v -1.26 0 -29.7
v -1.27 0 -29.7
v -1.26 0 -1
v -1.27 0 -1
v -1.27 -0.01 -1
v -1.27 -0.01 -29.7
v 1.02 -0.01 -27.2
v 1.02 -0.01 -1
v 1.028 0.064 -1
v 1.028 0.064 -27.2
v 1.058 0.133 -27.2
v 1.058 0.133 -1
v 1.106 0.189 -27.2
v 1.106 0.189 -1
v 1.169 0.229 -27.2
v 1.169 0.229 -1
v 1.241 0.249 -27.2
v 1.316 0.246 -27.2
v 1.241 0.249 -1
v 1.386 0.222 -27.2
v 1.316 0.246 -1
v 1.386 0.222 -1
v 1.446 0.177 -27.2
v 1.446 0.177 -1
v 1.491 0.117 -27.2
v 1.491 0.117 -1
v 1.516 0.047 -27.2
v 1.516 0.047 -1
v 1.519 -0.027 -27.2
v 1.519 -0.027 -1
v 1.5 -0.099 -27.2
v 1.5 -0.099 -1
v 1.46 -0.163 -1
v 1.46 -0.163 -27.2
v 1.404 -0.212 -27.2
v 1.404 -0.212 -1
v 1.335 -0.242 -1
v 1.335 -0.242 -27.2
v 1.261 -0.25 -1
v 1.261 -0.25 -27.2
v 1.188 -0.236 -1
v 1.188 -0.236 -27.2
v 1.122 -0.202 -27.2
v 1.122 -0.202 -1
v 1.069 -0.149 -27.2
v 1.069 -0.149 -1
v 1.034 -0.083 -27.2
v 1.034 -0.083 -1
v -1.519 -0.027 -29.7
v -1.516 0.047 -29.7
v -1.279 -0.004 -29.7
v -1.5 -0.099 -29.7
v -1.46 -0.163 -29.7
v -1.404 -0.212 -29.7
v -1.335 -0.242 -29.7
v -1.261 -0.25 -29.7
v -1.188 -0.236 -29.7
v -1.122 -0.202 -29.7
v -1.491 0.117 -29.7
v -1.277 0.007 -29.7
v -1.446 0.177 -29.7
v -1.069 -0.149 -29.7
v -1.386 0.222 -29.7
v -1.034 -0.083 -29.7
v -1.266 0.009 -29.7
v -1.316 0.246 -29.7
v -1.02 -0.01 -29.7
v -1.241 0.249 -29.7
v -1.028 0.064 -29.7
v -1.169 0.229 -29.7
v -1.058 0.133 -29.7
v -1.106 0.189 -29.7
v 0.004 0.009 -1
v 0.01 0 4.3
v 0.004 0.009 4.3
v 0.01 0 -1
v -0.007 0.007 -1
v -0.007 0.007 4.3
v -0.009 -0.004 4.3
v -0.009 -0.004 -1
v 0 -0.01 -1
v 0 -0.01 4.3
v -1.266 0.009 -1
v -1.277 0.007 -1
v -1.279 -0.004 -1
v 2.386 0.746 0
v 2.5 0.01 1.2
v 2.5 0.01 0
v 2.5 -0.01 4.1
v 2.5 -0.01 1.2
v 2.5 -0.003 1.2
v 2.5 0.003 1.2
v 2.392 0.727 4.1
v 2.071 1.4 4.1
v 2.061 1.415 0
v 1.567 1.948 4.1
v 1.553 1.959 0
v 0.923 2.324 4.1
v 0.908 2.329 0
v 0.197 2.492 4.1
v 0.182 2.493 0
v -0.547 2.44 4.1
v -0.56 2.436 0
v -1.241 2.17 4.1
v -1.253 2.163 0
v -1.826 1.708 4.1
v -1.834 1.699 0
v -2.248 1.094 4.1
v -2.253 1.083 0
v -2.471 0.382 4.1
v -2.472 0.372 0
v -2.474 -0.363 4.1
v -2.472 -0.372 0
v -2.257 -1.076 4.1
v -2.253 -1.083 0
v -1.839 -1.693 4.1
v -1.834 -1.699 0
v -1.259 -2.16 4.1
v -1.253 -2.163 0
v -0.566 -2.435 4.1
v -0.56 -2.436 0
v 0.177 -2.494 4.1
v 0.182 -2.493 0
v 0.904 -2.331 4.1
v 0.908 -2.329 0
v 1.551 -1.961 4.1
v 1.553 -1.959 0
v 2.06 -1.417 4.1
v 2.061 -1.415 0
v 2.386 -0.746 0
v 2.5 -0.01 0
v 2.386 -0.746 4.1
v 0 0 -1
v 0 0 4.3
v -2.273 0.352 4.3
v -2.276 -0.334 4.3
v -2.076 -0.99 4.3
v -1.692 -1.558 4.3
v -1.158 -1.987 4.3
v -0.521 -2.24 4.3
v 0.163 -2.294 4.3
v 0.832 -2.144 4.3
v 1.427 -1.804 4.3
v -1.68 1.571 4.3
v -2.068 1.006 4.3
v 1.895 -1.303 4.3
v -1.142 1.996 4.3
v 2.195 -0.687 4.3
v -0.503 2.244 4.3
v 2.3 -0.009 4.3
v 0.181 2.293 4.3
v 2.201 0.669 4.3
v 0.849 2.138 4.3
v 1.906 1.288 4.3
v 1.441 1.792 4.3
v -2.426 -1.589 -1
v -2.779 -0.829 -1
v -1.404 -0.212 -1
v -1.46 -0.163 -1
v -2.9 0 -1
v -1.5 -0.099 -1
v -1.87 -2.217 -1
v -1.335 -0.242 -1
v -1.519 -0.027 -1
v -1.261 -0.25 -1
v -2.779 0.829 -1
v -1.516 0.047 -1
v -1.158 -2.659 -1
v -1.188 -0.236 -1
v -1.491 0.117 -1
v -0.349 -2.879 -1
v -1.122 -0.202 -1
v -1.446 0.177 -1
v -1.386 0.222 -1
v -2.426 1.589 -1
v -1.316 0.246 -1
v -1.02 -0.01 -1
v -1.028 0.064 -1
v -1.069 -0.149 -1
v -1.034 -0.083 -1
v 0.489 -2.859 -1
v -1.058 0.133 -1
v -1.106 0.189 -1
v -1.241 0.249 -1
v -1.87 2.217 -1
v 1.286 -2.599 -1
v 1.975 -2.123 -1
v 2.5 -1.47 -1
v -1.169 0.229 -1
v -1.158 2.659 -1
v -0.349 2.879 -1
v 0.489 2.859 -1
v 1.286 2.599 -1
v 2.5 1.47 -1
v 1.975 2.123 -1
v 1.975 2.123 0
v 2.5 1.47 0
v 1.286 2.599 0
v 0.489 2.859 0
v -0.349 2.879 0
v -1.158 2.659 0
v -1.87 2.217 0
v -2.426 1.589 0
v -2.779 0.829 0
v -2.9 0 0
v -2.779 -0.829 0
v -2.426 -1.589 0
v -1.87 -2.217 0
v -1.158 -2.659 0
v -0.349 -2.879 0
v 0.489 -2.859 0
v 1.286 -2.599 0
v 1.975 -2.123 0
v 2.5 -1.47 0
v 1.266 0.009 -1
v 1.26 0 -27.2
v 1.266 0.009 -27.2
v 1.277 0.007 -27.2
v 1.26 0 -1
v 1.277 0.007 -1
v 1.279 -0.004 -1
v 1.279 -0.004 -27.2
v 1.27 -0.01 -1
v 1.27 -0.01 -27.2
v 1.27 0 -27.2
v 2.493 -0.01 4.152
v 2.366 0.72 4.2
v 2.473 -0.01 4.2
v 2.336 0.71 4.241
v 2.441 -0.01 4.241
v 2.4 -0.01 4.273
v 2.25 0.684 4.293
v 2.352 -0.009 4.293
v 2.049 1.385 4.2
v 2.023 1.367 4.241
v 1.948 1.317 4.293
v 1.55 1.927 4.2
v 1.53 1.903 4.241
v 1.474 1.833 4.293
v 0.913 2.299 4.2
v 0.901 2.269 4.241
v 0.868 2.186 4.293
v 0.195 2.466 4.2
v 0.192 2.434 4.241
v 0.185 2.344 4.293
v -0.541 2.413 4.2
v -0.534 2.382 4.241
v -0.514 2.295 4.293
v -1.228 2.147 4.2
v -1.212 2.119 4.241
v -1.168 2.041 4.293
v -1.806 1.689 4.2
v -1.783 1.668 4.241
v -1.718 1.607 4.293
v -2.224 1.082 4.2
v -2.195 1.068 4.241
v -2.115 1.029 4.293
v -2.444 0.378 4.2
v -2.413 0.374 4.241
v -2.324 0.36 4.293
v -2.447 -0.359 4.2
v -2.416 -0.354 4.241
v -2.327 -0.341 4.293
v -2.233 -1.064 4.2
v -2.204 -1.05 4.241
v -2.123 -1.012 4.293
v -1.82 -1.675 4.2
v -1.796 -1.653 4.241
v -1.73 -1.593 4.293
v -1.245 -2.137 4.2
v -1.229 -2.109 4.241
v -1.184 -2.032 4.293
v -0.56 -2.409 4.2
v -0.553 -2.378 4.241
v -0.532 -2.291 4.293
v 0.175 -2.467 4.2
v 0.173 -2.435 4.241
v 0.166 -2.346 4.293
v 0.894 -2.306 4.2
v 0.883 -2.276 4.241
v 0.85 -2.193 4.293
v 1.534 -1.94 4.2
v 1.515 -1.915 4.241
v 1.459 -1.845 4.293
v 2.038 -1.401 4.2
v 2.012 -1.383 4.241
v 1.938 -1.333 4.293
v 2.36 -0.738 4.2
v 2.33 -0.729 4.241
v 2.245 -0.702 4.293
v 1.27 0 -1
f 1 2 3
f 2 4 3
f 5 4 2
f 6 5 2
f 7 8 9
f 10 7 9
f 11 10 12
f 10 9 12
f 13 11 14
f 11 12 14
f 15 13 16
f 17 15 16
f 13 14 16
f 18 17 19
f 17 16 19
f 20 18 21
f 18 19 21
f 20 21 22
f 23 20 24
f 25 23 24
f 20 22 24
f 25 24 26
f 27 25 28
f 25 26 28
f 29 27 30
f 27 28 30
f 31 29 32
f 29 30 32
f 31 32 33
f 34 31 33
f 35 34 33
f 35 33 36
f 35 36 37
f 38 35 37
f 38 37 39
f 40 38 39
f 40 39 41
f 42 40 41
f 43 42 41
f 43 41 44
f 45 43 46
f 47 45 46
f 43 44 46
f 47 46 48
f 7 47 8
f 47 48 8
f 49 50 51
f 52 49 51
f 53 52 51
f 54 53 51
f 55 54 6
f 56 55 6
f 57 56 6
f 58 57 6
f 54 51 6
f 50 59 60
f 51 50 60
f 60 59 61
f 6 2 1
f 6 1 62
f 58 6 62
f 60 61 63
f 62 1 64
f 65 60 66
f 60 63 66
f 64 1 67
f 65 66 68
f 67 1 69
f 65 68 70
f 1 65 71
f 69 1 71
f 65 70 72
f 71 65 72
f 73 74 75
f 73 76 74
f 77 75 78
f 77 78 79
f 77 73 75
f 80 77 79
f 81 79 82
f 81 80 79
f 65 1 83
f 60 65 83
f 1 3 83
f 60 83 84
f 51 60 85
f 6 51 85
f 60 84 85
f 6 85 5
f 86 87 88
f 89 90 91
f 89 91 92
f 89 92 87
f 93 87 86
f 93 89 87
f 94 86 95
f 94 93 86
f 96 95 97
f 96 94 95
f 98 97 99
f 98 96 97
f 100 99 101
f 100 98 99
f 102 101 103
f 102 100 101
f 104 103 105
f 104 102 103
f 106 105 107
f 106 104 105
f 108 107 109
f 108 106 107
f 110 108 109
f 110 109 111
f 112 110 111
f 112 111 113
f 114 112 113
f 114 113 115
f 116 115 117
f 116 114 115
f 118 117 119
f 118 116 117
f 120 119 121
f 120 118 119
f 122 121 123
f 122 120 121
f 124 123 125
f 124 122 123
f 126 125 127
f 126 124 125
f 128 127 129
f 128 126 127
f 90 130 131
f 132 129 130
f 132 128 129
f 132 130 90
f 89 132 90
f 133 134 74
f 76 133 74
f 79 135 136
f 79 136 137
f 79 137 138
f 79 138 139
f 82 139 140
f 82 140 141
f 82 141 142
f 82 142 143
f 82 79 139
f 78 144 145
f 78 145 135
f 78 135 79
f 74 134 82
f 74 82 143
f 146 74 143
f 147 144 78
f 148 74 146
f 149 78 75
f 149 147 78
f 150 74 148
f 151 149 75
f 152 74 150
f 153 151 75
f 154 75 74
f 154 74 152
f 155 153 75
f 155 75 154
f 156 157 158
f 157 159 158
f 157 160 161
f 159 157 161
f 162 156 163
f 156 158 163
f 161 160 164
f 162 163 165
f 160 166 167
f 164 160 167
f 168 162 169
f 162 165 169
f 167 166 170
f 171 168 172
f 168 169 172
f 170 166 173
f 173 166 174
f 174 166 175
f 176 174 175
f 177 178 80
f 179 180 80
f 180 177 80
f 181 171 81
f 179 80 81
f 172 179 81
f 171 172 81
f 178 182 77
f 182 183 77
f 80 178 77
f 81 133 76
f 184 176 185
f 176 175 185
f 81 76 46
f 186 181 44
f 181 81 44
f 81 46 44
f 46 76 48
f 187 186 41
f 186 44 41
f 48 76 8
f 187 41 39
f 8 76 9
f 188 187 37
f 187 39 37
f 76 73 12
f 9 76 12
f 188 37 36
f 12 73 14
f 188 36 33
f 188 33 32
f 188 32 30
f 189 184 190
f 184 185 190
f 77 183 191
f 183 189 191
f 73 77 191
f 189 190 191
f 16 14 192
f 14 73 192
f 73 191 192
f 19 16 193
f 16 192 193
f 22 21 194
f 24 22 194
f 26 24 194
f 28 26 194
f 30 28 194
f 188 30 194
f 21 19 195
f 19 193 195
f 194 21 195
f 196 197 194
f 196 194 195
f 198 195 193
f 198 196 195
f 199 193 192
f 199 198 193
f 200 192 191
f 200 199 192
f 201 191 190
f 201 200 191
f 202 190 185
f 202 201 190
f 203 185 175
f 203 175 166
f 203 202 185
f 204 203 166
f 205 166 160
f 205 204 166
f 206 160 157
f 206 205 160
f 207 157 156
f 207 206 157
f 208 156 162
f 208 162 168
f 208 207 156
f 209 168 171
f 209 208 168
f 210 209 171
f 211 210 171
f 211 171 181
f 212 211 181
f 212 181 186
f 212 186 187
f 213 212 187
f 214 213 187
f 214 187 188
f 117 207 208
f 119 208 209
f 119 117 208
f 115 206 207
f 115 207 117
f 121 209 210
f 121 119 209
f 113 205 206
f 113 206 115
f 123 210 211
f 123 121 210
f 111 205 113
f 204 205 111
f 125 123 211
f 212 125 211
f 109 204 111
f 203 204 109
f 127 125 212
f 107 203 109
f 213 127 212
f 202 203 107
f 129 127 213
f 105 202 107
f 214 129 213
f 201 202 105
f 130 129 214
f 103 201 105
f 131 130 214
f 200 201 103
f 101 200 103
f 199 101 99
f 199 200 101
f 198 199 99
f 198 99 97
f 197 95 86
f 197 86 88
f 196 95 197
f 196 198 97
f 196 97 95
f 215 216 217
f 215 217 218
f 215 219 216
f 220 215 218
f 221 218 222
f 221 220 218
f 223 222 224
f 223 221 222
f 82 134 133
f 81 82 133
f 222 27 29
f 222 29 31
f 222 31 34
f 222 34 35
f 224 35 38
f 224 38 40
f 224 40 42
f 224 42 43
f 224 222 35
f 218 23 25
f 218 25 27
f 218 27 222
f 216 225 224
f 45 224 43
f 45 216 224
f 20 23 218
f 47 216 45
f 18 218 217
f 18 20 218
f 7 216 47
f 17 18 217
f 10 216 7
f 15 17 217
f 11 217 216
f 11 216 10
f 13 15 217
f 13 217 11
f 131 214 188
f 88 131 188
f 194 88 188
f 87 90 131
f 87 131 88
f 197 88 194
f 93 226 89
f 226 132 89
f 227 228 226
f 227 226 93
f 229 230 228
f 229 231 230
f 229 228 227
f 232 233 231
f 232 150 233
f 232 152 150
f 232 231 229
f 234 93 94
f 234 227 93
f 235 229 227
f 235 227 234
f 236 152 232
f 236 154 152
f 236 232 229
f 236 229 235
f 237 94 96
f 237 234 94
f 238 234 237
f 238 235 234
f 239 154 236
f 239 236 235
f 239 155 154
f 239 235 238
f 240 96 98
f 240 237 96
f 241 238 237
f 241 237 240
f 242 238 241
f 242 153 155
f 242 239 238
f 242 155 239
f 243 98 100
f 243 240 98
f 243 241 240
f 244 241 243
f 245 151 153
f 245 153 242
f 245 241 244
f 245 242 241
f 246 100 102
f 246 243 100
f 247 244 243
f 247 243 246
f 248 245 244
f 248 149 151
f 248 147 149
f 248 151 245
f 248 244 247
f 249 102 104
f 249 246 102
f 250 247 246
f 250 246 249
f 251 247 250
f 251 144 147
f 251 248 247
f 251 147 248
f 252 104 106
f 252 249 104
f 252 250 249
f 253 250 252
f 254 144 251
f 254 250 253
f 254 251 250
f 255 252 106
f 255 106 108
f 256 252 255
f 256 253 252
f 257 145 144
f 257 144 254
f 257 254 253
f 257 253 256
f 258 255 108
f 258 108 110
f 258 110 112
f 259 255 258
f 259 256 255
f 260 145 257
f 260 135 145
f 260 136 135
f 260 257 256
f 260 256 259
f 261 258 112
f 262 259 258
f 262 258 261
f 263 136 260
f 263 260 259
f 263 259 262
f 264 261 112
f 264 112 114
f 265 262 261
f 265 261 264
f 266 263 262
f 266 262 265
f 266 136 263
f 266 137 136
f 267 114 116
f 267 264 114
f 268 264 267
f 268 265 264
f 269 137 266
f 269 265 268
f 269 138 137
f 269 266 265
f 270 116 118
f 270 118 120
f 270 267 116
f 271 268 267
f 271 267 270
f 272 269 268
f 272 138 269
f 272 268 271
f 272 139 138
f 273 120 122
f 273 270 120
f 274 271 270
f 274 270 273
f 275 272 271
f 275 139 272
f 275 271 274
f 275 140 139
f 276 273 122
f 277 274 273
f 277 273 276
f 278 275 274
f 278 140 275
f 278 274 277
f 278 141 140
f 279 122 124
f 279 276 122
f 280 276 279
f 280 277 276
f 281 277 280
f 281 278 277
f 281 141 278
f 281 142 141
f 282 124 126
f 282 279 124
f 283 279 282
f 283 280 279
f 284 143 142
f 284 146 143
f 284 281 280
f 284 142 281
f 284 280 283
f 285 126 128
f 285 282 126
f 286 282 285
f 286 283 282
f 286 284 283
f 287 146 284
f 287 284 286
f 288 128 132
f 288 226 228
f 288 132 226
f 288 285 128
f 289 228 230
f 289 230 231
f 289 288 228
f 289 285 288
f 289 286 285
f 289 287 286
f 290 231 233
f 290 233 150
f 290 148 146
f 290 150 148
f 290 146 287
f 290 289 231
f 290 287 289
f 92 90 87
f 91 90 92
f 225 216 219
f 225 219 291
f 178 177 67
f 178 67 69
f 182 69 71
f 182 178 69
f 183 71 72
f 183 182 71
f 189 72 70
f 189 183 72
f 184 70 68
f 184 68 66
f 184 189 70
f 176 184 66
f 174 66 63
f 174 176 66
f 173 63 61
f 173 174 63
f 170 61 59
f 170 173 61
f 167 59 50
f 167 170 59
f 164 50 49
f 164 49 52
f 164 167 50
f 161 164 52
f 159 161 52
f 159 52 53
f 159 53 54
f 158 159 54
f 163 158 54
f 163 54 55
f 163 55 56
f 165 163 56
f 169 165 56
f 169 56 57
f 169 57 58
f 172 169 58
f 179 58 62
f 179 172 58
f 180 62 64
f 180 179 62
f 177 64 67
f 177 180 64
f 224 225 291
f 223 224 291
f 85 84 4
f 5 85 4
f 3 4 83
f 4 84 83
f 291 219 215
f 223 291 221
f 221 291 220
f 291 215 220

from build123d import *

# Parameters (mm, degrees)
F0_W      = 2.5
F0_H      = 4.3
F1_DEPTH  = 0.01
F4_W      = 3
F4_H      = 2.4
F5_DEPTH  = 2
F0_W_2    = 0.25
F0_H_2    = 26.2
F6_DEPTH  = 0.01
F7_DEPTH  = 0.01
F7_FACE_W = 0.25
F7_FACE_H = 28.7
F6_FACE_W = 0.25
F6_FACE_H = 26.2
F10_R     = 0.2


with BuildPart() as f1:
    # F0 (on Front) → F1 (new body)
    with BuildSketch(Plane.XZ):
        with Locations((1.25, 2.15)):
            Rectangle(F0_W, F0_H)
        Polygon((2.5, 0), (0, 0), (0, -1), (1.02, -1), (1.27, -1), (2.9, -1), (2.9, 0), align=None)
    extrude(amount=F1_DEPTH)

    # F1_face (on face) → F2 (revolve)
    with BuildSketch(Plane(origin=(1.2924908425, -0.01, 1.586996337), x_dir=(1, 0, 0), z_dir=(0, -1, 0))):
        Polygon((-1.2924908425, 2.713003663), (-1.2924908425, -2.586996337), (1.6075091575, -2.586996337), (1.6075091575, -1.586996337), (1.2075091575, -1.586996337), (1.2075091575, 2.713003663), align=None)
    revolve(axis=Axis((0, 0, 1.65), (0, 0, 1)))

    # F4 (on offset) → F5 (cut)
    with BuildSketch(Plane.YZ.offset(2.5)):
        Rectangle(F4_W, F4_H)
    extrude(amount=F5_DEPTH, mode=Mode.SUBTRACT)

    # F0 (on Front) → F6 (join)
    with BuildSketch(Plane.XZ):
        with Locations((1.145, -14.1)):
            Rectangle(F0_W_2, F0_H_2)
    extrude(amount=F6_DEPTH)

    # F0 (on Front) → F7 (join)
    with BuildSketch(Plane.XZ):
        Polygon((-1.02, -29.7), (-1.02, -27.2), (-1.02, -1), (-1.27, -1), (-1.27, -29.7), align=None)
    extrude(amount=F7_DEPTH)

    # F7_face (on face) → F8 (revolve)
    with BuildSketch(Plane(origin=(-1.145, -0.01, -15.35), x_dir=(1, 0, 0), z_dir=(0, -1, 0))):
        Rectangle(F7_FACE_W, F7_FACE_H)
    revolve(axis=Axis((-1.27, 0, -15.35), (0, 0, 1)))

    # F6_face (on face) → F9 (revolve)
    with BuildSketch(Plane(origin=(1.145, -0.01, -14.1), x_dir=(1, 0, 0), z_dir=(0, -1, 0))):
        Rectangle(F6_FACE_W, F6_FACE_H)
    revolve(axis=Axis((1.27, 0, -14.1), (0, 0, -1)))

    # F10
    f10_edges = [f1.edges().sort_by_distance(p)[0] for p in [
        (-2.5, 0.01, 4.3),
    ]]
    fillet(f10_edges, radius=F10_R)


solid = f1.part
